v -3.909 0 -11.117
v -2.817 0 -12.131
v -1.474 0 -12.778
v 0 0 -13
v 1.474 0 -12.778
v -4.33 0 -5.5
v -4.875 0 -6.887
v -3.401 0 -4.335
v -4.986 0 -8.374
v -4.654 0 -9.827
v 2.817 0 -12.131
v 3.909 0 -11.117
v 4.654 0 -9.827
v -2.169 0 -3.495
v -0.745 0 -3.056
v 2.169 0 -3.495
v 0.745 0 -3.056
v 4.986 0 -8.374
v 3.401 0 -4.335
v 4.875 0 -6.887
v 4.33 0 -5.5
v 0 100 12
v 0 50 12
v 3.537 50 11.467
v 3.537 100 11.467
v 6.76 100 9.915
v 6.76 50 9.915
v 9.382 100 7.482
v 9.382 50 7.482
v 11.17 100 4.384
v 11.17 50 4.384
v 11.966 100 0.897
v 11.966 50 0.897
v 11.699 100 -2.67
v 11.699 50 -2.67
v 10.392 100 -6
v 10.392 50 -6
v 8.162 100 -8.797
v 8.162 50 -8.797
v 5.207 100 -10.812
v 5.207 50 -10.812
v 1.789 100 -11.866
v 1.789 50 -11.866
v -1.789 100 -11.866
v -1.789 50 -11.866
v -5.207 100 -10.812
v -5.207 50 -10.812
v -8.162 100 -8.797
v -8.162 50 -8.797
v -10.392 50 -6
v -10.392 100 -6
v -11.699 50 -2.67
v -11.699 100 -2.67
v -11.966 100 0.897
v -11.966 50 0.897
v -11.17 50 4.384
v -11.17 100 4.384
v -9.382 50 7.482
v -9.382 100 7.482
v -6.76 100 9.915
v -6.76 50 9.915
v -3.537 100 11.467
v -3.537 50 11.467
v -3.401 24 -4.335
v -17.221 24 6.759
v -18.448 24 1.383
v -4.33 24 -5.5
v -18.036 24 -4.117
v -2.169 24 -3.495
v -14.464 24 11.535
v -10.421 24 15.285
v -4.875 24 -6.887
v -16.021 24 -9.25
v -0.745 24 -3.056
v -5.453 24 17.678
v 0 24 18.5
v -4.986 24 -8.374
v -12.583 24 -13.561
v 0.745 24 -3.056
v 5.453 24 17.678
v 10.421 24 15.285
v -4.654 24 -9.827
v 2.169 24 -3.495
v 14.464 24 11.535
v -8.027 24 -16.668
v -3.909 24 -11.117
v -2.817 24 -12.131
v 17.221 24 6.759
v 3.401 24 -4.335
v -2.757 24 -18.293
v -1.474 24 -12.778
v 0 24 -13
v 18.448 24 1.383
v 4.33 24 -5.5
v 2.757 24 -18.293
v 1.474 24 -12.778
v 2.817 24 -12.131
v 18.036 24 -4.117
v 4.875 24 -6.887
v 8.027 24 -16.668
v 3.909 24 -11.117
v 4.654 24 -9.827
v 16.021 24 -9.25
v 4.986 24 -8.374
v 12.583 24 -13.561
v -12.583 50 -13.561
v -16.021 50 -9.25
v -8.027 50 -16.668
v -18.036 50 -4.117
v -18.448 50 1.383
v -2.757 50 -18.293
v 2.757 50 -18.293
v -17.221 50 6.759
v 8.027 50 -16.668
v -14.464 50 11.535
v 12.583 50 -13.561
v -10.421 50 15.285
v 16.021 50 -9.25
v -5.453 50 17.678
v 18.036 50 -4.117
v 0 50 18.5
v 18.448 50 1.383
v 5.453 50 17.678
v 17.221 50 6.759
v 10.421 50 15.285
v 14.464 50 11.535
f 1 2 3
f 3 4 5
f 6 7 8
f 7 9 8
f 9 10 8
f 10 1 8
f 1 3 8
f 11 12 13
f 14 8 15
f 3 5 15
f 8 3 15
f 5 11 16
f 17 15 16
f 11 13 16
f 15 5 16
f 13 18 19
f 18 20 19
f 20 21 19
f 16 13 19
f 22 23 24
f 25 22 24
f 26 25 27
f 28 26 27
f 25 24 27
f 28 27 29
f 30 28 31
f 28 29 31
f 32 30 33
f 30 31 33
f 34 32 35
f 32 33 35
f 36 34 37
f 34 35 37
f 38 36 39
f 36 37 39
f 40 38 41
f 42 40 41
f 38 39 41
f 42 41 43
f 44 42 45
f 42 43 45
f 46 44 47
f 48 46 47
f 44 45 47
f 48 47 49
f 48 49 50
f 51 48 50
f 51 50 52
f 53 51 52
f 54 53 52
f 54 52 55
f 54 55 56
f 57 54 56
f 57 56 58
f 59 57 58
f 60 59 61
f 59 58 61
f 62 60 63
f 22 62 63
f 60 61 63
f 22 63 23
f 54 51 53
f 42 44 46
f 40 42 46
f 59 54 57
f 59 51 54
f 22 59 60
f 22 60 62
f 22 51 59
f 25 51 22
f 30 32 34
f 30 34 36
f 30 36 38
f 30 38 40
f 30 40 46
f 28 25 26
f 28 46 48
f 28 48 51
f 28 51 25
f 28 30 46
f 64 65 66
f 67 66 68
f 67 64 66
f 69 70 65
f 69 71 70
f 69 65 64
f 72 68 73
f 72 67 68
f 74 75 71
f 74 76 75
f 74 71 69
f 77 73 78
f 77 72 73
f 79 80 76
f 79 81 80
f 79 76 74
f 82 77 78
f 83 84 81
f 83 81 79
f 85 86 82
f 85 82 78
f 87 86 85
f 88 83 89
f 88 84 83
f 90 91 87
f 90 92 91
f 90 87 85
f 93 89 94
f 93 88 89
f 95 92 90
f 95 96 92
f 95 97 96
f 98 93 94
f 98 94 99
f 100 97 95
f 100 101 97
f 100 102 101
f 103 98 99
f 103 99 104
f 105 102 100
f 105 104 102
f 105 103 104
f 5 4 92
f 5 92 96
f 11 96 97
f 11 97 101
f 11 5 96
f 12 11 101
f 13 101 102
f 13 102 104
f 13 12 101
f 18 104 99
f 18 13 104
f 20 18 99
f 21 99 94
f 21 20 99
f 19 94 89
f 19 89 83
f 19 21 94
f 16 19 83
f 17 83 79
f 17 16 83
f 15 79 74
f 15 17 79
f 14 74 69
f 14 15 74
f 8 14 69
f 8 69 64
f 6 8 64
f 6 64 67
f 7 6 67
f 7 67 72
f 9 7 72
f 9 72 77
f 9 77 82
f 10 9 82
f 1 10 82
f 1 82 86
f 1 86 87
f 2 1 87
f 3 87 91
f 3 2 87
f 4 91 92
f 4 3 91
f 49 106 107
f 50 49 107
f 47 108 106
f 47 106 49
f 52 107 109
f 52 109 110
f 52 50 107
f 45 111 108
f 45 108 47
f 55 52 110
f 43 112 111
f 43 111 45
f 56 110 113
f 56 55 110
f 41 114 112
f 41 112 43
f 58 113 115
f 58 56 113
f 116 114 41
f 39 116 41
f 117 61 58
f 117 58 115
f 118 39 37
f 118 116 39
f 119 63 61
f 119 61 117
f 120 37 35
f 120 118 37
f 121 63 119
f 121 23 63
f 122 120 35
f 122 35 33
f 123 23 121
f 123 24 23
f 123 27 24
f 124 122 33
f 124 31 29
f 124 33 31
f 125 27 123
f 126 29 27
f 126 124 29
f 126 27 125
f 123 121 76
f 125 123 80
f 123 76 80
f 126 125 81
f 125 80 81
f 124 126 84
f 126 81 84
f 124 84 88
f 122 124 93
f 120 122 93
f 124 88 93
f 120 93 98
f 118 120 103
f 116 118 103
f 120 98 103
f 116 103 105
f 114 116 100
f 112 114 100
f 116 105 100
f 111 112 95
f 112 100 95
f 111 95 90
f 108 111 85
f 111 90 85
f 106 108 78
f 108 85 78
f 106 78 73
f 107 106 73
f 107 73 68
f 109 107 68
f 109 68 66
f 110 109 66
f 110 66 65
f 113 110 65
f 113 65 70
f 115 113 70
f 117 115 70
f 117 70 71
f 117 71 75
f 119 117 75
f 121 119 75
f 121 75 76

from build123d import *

# Parameters (mm, degrees)
ESBO_O1_R                = 18.5
RESSALTO_EXTRUS_O1_DEPTH = 100
CORTE_EXTRUS_O1_START    = -50
ESBO_O2_R                = 18.5
ESBO_O2_R_2              = 12
CORTE_EXTRUS_O1_DEPTH    = 50
ESBO_O3_R                = 18.5
ESBO_O3_R_2              = 5
CORTE_EXTRUS_O2_DEPTH    = 24


with BuildPart() as part:
    # Esboço1 → Ressalto-extrusão1 (new body)
    with BuildSketch(Plane(origin=(0, 0, 0), x_dir=(1, 0, 0), z_dir=(0, 1, 0))):
        with Locations(Location((0, 0, 0), (0, 0, 270))):
            Circle(ESBO_O1_R)
    extrude(amount=RESSALTO_EXTRUS_O1_DEPTH)

    # Esboço2 → Corte-extrusão1 (cut)
    with BuildSketch(Plane(origin=(0, 100, 0), x_dir=(1, 0, 0), z_dir=(0, 1, 0)).offset(CORTE_EXTRUS_O1_START)):
        with Locations(Location((0, 0, 0), (0, 0, 270))):
            Circle(ESBO_O2_R)
        with Locations(Location((0, 0, 0), (0, 0, 270))):
            Circle(ESBO_O2_R_2, mode=Mode.SUBTRACT)
    extrude(amount=CORTE_EXTRUS_O1_DEPTH, mode=Mode.SUBTRACT)

    # Esboço3 → Corte-extrusão2 (cut)
    with BuildSketch(Plane(origin=(0, 0, 0), x_dir=(-1, 0, 0), z_dir=(0, -1, 0))):
        with Locations(Location((0, 0, 0), (0, 0, 90))):
            Circle(ESBO_O3_R)
        with Locations(Location((0, 8, 0), (0, 0, 90))):
            Circle(ESBO_O3_R_2, mode=Mode.SUBTRACT)
    extrude(amount=-CORTE_EXTRUS_O2_DEPTH, mode=Mode.SUBTRACT)


solid = part.part
